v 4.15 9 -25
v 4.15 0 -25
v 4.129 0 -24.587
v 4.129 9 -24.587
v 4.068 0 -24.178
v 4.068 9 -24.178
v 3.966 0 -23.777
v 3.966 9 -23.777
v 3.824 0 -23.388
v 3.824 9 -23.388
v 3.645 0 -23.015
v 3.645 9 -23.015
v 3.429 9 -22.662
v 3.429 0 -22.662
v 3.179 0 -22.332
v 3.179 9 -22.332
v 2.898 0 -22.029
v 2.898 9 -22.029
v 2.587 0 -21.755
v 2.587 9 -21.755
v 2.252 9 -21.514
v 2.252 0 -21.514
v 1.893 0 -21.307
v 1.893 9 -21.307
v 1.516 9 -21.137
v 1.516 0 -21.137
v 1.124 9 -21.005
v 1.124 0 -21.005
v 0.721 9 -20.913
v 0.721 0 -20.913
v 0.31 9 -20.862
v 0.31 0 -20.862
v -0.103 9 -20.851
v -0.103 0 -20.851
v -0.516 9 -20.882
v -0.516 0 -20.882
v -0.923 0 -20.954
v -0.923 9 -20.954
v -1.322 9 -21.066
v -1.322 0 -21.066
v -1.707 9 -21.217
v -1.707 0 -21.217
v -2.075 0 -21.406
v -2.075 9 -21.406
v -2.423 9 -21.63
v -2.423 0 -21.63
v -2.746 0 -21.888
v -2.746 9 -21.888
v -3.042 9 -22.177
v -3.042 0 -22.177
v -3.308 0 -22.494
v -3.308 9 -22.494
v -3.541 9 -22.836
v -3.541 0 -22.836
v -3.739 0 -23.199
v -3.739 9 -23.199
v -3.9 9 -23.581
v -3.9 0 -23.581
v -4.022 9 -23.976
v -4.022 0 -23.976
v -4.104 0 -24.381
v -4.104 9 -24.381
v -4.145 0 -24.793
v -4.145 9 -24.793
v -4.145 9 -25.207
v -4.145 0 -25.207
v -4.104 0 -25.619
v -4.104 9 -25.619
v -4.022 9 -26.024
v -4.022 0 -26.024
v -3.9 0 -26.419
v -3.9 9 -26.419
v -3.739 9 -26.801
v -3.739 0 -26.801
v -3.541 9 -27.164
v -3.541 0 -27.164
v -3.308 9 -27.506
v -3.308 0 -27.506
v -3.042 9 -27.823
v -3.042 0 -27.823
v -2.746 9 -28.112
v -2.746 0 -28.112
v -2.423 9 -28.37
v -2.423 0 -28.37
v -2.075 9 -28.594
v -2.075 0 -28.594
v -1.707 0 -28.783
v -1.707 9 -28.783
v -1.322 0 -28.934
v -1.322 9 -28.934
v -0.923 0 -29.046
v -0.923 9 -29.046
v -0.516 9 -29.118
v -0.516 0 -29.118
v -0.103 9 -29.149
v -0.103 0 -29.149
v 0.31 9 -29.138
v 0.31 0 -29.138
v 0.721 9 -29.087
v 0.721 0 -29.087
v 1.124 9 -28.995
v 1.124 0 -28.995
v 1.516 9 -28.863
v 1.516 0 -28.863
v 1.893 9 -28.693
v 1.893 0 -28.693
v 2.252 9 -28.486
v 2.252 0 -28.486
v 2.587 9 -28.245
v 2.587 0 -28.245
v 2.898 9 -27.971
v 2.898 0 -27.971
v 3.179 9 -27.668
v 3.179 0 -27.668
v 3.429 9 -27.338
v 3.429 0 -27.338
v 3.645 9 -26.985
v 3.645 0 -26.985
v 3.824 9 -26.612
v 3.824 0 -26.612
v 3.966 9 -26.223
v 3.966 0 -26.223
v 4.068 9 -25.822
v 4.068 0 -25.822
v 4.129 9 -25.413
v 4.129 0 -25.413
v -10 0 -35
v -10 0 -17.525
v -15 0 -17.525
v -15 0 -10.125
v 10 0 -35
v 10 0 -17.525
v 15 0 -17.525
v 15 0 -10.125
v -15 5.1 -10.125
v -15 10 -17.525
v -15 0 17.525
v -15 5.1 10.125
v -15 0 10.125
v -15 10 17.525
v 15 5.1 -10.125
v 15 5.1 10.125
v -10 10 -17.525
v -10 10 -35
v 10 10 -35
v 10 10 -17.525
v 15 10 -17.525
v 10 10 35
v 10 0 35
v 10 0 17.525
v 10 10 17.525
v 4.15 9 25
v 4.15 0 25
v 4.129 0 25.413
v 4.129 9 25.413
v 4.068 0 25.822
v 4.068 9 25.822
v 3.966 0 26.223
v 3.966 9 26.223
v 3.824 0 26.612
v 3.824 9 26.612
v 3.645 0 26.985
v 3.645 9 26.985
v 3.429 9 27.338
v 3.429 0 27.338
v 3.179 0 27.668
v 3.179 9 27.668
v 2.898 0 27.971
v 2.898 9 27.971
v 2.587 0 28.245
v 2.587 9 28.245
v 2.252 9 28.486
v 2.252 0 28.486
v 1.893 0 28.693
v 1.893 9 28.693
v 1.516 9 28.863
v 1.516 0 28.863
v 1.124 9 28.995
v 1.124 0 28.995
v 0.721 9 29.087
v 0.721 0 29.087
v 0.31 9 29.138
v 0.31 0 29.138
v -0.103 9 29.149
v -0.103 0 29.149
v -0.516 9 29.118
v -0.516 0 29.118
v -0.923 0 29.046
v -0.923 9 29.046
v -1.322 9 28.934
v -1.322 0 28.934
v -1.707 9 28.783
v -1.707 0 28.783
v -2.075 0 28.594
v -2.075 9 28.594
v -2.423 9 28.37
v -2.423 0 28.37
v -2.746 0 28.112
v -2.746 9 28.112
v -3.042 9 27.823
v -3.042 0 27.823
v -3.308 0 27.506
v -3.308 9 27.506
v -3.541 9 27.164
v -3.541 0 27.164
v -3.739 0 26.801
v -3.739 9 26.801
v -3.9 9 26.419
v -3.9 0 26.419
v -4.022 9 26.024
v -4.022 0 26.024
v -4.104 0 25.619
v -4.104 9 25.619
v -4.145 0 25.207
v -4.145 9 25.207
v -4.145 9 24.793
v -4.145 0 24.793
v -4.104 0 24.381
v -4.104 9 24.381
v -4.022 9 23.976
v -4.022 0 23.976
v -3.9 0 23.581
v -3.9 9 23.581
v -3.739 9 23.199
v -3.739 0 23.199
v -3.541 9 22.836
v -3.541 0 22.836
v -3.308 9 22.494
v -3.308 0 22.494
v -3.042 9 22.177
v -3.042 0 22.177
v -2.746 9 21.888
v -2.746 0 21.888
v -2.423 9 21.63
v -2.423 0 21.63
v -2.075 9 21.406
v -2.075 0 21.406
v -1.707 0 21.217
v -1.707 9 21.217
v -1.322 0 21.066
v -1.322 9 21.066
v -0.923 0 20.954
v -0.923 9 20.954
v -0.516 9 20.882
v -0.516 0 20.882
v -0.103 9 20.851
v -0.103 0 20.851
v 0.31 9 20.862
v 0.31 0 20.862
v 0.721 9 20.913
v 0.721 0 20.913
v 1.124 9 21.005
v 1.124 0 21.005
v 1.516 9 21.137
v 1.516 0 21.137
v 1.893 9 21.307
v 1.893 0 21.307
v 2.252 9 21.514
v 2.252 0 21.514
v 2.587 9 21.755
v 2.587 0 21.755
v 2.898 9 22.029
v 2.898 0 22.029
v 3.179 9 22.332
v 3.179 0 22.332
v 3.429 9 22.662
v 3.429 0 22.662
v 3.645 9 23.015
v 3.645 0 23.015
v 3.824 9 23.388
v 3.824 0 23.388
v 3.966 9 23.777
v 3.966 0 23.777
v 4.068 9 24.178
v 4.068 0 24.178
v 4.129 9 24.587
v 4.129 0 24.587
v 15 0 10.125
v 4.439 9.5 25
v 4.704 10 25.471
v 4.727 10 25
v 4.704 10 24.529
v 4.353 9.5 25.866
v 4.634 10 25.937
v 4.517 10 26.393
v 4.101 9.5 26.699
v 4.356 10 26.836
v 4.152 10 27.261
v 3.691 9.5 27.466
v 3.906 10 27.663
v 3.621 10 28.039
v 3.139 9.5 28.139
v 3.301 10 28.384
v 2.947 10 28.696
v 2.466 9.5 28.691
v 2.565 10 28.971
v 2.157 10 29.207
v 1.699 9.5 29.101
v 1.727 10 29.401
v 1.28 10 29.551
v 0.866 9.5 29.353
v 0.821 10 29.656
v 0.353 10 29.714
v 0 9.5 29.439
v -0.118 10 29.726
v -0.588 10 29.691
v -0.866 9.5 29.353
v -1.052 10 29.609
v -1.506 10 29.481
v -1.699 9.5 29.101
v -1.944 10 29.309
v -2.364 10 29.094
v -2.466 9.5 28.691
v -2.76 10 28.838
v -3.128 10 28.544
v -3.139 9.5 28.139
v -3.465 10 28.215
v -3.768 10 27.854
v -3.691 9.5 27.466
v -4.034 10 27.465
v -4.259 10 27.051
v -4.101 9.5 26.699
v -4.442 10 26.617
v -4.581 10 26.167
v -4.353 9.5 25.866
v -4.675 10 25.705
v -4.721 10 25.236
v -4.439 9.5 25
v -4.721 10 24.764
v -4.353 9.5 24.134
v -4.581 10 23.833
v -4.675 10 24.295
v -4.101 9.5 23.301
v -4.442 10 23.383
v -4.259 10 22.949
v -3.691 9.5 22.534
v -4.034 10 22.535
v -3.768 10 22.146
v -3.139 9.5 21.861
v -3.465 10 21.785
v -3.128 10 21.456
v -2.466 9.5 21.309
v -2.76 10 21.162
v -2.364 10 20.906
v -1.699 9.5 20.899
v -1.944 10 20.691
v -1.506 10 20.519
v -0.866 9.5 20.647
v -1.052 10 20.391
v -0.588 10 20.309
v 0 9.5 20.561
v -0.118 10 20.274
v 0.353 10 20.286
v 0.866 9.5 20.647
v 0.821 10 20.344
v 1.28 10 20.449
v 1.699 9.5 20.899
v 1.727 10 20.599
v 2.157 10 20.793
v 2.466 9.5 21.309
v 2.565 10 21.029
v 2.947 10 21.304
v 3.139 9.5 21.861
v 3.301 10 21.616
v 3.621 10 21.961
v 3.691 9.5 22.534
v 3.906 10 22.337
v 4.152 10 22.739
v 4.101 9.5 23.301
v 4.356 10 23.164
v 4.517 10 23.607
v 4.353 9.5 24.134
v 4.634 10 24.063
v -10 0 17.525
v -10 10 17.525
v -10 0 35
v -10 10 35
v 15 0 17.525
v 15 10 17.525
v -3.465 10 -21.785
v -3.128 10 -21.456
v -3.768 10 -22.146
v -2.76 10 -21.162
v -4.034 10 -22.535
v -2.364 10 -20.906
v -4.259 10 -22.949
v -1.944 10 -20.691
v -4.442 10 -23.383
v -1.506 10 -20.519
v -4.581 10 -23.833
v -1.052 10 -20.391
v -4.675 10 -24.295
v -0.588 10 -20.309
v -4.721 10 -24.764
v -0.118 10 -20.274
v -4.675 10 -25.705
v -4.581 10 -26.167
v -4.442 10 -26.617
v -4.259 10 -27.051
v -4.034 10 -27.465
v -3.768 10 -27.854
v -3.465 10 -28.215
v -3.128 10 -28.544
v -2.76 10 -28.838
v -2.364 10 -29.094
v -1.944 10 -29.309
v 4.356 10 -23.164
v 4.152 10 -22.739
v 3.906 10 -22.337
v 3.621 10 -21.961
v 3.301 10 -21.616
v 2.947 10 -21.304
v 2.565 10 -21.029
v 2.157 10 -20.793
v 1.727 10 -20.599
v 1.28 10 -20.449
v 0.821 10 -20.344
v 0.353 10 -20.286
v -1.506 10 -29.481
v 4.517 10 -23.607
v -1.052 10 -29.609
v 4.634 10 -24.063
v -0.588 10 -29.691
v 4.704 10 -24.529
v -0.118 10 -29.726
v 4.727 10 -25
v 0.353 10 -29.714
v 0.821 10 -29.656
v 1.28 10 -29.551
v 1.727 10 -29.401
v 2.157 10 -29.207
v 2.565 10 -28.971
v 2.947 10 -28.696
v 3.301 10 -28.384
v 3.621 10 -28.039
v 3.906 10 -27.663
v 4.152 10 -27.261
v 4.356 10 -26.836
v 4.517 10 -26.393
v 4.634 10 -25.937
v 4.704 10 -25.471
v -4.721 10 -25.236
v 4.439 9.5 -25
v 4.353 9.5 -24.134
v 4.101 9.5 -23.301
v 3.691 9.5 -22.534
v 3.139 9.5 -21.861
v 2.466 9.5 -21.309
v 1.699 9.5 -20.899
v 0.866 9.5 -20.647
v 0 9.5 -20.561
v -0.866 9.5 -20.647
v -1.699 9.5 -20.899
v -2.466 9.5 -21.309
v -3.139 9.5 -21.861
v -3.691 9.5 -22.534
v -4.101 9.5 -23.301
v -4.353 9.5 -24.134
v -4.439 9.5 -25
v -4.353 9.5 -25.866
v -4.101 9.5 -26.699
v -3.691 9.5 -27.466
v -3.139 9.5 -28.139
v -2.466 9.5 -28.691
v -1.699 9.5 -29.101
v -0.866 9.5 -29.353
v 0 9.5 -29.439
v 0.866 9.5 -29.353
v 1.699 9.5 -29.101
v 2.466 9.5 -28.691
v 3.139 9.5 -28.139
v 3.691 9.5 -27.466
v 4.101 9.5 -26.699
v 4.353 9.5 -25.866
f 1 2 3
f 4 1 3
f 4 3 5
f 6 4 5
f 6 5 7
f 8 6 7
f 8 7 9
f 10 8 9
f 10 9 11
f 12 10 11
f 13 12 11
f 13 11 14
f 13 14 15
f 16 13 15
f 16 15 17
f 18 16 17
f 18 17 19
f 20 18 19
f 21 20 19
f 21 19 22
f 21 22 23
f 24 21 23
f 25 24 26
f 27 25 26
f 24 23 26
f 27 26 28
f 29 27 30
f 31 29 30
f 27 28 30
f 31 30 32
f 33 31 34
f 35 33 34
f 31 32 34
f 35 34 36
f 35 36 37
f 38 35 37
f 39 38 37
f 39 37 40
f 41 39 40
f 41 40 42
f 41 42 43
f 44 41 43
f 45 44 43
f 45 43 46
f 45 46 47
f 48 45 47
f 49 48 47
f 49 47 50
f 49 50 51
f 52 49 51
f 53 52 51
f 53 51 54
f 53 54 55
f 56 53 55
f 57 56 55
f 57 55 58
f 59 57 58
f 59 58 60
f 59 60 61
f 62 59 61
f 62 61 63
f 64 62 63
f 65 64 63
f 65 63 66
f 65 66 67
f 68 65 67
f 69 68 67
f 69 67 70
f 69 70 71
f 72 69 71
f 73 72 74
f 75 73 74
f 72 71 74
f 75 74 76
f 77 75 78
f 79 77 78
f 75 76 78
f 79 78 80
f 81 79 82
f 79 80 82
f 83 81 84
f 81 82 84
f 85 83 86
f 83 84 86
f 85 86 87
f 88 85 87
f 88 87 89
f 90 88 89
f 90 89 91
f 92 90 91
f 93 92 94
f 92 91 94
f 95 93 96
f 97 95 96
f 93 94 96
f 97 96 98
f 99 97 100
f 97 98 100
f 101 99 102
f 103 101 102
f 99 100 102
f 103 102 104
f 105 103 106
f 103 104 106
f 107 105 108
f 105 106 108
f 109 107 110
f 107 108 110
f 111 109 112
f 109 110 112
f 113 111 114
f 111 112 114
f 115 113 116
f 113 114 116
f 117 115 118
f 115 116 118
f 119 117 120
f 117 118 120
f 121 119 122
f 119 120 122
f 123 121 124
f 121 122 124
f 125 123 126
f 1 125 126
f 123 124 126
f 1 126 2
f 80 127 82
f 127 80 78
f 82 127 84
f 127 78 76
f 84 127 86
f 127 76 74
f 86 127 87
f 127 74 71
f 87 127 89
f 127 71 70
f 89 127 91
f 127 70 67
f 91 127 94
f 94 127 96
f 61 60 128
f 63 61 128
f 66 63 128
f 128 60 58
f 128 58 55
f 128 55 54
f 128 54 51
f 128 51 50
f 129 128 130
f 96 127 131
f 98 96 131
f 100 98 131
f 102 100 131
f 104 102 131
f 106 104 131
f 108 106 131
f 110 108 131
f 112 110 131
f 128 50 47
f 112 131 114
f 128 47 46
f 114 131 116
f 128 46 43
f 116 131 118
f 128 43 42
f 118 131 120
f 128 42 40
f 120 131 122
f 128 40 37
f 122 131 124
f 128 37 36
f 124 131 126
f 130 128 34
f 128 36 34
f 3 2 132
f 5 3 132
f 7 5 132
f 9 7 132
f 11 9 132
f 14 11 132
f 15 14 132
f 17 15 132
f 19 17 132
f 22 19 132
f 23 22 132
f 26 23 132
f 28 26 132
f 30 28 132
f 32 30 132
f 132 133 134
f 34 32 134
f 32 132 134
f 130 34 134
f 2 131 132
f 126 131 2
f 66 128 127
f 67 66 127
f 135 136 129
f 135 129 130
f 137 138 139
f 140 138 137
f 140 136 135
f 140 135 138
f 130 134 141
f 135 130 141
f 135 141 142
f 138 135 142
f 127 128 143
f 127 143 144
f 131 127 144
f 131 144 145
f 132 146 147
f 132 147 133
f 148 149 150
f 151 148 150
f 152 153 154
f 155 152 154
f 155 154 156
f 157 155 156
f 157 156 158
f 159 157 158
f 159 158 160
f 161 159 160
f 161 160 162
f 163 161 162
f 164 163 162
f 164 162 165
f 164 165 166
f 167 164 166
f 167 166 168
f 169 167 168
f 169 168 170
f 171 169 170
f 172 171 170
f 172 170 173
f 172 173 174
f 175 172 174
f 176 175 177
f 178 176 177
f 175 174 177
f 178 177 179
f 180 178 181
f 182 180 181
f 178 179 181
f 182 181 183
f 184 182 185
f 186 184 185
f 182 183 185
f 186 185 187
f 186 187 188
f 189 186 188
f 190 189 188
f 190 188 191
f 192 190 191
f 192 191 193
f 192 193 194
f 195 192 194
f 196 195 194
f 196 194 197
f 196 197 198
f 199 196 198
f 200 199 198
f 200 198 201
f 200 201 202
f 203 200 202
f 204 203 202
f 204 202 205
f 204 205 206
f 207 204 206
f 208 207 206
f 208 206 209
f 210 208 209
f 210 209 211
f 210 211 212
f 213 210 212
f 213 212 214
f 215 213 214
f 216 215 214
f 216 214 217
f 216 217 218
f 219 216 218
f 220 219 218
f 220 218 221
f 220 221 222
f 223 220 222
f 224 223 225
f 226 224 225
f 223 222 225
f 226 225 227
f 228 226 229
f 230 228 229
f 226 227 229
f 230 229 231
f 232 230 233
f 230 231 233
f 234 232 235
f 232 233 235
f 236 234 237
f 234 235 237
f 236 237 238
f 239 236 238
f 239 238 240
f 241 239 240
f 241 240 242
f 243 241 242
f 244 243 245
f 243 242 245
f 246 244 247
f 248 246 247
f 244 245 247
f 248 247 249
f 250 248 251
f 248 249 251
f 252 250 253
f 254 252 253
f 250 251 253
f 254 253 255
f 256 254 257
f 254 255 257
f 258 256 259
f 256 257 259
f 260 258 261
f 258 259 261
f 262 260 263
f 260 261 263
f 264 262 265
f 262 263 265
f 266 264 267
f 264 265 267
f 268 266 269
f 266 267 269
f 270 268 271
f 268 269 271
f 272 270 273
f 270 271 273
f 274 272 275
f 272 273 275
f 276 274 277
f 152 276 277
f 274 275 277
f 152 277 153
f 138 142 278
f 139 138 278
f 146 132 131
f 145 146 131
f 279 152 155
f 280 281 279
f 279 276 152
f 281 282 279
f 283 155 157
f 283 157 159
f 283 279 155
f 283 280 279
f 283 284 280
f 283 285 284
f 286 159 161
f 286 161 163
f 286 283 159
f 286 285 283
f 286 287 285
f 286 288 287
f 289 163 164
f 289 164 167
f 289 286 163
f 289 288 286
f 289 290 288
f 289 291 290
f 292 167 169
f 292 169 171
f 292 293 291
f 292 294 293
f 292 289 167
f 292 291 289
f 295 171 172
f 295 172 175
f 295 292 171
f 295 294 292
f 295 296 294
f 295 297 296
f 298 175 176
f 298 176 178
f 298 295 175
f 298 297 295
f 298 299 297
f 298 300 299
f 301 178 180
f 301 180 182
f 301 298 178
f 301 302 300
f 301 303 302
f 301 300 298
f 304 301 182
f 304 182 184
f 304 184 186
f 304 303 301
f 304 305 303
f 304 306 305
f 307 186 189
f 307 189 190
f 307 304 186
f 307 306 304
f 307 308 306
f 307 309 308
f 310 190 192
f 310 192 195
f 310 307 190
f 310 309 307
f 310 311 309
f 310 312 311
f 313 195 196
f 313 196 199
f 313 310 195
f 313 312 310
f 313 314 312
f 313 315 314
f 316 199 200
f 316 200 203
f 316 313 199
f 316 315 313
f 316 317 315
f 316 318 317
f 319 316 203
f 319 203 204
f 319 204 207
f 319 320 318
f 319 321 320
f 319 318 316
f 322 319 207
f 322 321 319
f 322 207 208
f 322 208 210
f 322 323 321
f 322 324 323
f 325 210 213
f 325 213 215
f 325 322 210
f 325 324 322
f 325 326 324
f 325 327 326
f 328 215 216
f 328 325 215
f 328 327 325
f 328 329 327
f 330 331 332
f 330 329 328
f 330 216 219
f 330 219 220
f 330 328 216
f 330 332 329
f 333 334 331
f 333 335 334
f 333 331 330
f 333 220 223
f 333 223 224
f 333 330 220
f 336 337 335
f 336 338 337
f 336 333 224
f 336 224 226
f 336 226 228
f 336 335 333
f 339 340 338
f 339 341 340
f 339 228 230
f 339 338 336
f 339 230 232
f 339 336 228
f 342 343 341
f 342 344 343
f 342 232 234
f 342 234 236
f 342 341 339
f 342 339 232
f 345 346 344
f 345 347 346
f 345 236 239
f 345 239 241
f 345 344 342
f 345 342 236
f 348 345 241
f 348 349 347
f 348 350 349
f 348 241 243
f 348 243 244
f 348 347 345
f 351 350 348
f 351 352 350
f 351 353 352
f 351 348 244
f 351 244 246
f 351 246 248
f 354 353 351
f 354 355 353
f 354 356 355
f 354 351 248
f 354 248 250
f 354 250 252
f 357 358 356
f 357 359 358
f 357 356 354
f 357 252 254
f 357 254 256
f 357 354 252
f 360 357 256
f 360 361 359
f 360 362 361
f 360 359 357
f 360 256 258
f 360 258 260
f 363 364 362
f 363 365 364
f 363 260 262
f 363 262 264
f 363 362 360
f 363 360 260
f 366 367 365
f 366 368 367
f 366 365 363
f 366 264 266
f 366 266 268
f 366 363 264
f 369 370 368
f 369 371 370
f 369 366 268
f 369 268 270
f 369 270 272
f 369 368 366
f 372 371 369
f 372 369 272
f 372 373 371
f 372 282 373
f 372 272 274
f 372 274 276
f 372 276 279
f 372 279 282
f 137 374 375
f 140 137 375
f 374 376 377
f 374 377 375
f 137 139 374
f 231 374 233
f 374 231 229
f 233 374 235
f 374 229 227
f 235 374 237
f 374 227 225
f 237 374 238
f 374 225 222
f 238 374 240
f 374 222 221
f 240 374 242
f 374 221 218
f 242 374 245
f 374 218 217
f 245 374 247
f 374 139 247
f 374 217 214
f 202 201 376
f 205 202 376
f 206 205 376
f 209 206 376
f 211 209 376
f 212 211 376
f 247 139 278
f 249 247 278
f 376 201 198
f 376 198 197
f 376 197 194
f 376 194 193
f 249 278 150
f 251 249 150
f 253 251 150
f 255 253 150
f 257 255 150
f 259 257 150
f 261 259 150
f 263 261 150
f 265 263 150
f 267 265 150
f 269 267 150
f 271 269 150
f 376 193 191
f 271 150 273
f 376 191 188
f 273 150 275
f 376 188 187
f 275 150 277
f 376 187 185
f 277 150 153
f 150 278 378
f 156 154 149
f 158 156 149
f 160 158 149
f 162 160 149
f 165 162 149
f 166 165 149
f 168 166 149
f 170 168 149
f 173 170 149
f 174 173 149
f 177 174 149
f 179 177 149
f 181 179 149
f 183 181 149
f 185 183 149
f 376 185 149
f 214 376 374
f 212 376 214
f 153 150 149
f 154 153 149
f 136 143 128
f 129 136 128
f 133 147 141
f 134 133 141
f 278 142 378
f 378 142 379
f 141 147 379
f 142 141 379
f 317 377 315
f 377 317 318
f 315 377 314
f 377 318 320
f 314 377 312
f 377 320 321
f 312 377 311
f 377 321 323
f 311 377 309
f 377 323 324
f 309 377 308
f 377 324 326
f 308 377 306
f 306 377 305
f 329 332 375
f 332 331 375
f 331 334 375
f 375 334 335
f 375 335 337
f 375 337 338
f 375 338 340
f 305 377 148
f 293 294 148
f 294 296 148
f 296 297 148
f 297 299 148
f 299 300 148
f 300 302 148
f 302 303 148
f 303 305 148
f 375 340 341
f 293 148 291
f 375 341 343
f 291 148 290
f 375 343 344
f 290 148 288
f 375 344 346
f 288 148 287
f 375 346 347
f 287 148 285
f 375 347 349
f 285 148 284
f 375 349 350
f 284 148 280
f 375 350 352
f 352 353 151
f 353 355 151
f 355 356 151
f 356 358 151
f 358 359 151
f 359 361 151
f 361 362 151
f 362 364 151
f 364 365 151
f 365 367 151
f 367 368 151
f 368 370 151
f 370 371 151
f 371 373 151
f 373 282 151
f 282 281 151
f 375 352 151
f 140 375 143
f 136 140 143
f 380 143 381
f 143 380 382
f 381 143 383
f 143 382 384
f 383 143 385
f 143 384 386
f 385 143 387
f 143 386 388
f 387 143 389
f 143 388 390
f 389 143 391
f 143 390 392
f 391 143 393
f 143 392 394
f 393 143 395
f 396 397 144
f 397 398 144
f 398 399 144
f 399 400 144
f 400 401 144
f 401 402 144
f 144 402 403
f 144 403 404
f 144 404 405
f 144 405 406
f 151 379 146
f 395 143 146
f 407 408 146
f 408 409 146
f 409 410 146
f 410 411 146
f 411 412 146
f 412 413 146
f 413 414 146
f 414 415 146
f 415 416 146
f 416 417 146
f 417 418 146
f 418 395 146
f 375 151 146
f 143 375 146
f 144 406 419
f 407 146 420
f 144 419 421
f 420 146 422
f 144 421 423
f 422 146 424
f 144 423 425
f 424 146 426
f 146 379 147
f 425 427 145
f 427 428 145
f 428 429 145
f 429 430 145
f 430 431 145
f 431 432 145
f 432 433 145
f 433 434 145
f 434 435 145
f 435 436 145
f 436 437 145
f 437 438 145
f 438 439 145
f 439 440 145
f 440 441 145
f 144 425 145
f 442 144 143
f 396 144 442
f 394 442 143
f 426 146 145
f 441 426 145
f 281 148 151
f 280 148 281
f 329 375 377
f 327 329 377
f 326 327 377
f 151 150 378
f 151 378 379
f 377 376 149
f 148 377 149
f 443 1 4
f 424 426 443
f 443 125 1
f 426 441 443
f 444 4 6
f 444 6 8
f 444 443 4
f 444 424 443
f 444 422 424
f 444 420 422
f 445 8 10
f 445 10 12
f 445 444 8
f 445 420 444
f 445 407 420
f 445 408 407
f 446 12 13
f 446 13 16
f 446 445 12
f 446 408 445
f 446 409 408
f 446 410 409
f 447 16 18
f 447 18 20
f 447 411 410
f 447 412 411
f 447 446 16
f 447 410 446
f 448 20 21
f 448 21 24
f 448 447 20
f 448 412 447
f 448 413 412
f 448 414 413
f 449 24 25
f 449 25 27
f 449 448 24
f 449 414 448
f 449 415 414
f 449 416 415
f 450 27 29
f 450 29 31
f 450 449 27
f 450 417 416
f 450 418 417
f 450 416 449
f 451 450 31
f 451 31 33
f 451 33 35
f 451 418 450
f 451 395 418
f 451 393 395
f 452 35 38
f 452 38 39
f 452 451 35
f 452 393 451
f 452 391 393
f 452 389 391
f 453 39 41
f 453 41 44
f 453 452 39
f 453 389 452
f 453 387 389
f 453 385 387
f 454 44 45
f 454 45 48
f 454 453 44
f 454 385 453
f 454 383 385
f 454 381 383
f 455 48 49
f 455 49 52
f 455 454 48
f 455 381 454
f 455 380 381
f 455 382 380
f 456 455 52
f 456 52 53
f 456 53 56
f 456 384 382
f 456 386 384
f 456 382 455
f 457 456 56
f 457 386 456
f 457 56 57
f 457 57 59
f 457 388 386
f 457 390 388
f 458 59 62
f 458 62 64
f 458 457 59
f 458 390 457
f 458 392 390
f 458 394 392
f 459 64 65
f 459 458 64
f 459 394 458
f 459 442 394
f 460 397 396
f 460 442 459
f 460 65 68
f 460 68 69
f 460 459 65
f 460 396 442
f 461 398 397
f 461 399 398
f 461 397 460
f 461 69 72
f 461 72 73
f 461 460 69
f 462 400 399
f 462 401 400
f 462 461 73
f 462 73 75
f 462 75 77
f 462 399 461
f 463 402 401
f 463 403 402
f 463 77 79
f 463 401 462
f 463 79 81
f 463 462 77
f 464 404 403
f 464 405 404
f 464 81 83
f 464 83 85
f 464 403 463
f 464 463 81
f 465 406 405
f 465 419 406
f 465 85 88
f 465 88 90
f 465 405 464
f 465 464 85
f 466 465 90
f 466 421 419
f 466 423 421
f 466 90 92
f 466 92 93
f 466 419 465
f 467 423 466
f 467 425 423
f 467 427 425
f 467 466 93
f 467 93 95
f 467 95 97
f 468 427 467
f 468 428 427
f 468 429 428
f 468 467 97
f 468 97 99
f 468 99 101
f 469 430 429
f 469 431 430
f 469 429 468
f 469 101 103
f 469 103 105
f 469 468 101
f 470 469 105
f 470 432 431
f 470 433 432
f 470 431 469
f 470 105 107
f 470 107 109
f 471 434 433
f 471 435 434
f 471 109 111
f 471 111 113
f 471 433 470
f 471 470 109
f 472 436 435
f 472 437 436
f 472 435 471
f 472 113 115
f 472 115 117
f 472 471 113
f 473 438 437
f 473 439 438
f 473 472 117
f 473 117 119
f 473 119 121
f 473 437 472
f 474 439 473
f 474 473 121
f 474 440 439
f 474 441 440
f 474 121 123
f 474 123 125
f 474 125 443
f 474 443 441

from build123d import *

# Parameters (mm, degrees)
SKETCH1_W                = 20
SKETCH1_H                = 70
BOSS_EXTRUDE1_DEPTH      = 10
SKETCH2_W                = 20.25
SKETCH2_H                = 5.1
CUT_EXTRUDE1_DEPTH       = 1
CUT_EXTRUDE1_DEPTH_BACK  = 21
SKETCH3_R                = 4.15
CUT_EXTRUDE2_DEPTH       = 11
BOSS_EXTRUDE2_DEPTH      = 5
BOSS_EXTRUDE2_DEPTH_BACK = 25
CHAMFER1_SIZE            = 1
CHAMFER1_SIZE2           = 0.577350269
CHAMFER1_PART_2_SIZE     = 1
CHAMFER1_PART_2_SIZE2    = 0.577350269


with BuildPart() as part:
    # Sketch1 → Boss-Extrude1 (new body)
    with BuildSketch(Plane(origin=(0, 0, 0), x_dir=(1, 0, 0), z_dir=(0, 1, 0))):
        Rectangle(SKETCH1_W, SKETCH1_H)
    extrude(amount=BOSS_EXTRUDE1_DEPTH)

    # Sketch2 → Cut-Extrude1 (cut, two sides)
    with BuildSketch(Plane(origin=(10, 0, 0), x_dir=(0, 0, -1), z_dir=(1, 0, 0))) as cut_extrude1_sk:
        with Locations((0, 2.55)):
            Rectangle(SKETCH2_W, SKETCH2_H)
    extrude(amount=CUT_EXTRUDE1_DEPTH, mode=Mode.SUBTRACT)
    extrude(cut_extrude1_sk.sketch, amount=-CUT_EXTRUDE1_DEPTH_BACK, mode=Mode.SUBTRACT)

    # Sketch3 → Cut-Extrude2 (cut, through all)
    with BuildSketch(Plane.XZ):
        with Locations((0, 25)):
            Circle(SKETCH3_R)
        with Locations((0, -25)):
            Circle(SKETCH3_R)
    extrude(amount=-CUT_EXTRUDE2_DEPTH, mode=Mode.SUBTRACT)

    # Sketch4 → Boss-Extrude2 (add, two sides)
    with BuildSketch(Plane(origin=(10, 0, 0), x_dir=(0, 0, -1), z_dir=(1, 0, 0))) as boss_extrude2_sk:
        Polygon((-10.125, 0), (-17.525, 0), (-17.525, 10), (17.525, 10), (17.525, 0), (10.125, 0), (10.125, 5.1), (-10.125, 5.1), align=None)
    extrude(amount=BOSS_EXTRUDE2_DEPTH)
    extrude(boss_extrude2_sk.sketch, amount=-BOSS_EXTRUDE2_DEPTH_BACK)

    # Chamfer1
    chamfer1_edges = [part.edges().sort_by_distance(p)[0] for p in [
        (-4.15, 10, 25),
    ]]
    chamfer1_side = [part.faces().sort_by_distance(p)[0] for p in [
        (-4.15, 5, 25),
    ]]
    chamfer(chamfer1_edges, length=CHAMFER1_SIZE, length2=CHAMFER1_SIZE2, reference=chamfer1_side[0])

    # Chamfer1 part 2
    chamfer1_part_2_edges = [part.edges().sort_by_distance(p)[0] for p in [
        (-4.15, 10, -25),
    ]]
    chamfer1_part_2_side = [part.faces().sort_by_distance(p)[0] for p in [
        (-4.15, 5, -25),
    ]]
    chamfer(chamfer1_part_2_edges, length=CHAMFER1_PART_2_SIZE, length2=CHAMFER1_PART_2_SIZE2, reference=chamfer1_part_2_side[0])


solid = part.part
